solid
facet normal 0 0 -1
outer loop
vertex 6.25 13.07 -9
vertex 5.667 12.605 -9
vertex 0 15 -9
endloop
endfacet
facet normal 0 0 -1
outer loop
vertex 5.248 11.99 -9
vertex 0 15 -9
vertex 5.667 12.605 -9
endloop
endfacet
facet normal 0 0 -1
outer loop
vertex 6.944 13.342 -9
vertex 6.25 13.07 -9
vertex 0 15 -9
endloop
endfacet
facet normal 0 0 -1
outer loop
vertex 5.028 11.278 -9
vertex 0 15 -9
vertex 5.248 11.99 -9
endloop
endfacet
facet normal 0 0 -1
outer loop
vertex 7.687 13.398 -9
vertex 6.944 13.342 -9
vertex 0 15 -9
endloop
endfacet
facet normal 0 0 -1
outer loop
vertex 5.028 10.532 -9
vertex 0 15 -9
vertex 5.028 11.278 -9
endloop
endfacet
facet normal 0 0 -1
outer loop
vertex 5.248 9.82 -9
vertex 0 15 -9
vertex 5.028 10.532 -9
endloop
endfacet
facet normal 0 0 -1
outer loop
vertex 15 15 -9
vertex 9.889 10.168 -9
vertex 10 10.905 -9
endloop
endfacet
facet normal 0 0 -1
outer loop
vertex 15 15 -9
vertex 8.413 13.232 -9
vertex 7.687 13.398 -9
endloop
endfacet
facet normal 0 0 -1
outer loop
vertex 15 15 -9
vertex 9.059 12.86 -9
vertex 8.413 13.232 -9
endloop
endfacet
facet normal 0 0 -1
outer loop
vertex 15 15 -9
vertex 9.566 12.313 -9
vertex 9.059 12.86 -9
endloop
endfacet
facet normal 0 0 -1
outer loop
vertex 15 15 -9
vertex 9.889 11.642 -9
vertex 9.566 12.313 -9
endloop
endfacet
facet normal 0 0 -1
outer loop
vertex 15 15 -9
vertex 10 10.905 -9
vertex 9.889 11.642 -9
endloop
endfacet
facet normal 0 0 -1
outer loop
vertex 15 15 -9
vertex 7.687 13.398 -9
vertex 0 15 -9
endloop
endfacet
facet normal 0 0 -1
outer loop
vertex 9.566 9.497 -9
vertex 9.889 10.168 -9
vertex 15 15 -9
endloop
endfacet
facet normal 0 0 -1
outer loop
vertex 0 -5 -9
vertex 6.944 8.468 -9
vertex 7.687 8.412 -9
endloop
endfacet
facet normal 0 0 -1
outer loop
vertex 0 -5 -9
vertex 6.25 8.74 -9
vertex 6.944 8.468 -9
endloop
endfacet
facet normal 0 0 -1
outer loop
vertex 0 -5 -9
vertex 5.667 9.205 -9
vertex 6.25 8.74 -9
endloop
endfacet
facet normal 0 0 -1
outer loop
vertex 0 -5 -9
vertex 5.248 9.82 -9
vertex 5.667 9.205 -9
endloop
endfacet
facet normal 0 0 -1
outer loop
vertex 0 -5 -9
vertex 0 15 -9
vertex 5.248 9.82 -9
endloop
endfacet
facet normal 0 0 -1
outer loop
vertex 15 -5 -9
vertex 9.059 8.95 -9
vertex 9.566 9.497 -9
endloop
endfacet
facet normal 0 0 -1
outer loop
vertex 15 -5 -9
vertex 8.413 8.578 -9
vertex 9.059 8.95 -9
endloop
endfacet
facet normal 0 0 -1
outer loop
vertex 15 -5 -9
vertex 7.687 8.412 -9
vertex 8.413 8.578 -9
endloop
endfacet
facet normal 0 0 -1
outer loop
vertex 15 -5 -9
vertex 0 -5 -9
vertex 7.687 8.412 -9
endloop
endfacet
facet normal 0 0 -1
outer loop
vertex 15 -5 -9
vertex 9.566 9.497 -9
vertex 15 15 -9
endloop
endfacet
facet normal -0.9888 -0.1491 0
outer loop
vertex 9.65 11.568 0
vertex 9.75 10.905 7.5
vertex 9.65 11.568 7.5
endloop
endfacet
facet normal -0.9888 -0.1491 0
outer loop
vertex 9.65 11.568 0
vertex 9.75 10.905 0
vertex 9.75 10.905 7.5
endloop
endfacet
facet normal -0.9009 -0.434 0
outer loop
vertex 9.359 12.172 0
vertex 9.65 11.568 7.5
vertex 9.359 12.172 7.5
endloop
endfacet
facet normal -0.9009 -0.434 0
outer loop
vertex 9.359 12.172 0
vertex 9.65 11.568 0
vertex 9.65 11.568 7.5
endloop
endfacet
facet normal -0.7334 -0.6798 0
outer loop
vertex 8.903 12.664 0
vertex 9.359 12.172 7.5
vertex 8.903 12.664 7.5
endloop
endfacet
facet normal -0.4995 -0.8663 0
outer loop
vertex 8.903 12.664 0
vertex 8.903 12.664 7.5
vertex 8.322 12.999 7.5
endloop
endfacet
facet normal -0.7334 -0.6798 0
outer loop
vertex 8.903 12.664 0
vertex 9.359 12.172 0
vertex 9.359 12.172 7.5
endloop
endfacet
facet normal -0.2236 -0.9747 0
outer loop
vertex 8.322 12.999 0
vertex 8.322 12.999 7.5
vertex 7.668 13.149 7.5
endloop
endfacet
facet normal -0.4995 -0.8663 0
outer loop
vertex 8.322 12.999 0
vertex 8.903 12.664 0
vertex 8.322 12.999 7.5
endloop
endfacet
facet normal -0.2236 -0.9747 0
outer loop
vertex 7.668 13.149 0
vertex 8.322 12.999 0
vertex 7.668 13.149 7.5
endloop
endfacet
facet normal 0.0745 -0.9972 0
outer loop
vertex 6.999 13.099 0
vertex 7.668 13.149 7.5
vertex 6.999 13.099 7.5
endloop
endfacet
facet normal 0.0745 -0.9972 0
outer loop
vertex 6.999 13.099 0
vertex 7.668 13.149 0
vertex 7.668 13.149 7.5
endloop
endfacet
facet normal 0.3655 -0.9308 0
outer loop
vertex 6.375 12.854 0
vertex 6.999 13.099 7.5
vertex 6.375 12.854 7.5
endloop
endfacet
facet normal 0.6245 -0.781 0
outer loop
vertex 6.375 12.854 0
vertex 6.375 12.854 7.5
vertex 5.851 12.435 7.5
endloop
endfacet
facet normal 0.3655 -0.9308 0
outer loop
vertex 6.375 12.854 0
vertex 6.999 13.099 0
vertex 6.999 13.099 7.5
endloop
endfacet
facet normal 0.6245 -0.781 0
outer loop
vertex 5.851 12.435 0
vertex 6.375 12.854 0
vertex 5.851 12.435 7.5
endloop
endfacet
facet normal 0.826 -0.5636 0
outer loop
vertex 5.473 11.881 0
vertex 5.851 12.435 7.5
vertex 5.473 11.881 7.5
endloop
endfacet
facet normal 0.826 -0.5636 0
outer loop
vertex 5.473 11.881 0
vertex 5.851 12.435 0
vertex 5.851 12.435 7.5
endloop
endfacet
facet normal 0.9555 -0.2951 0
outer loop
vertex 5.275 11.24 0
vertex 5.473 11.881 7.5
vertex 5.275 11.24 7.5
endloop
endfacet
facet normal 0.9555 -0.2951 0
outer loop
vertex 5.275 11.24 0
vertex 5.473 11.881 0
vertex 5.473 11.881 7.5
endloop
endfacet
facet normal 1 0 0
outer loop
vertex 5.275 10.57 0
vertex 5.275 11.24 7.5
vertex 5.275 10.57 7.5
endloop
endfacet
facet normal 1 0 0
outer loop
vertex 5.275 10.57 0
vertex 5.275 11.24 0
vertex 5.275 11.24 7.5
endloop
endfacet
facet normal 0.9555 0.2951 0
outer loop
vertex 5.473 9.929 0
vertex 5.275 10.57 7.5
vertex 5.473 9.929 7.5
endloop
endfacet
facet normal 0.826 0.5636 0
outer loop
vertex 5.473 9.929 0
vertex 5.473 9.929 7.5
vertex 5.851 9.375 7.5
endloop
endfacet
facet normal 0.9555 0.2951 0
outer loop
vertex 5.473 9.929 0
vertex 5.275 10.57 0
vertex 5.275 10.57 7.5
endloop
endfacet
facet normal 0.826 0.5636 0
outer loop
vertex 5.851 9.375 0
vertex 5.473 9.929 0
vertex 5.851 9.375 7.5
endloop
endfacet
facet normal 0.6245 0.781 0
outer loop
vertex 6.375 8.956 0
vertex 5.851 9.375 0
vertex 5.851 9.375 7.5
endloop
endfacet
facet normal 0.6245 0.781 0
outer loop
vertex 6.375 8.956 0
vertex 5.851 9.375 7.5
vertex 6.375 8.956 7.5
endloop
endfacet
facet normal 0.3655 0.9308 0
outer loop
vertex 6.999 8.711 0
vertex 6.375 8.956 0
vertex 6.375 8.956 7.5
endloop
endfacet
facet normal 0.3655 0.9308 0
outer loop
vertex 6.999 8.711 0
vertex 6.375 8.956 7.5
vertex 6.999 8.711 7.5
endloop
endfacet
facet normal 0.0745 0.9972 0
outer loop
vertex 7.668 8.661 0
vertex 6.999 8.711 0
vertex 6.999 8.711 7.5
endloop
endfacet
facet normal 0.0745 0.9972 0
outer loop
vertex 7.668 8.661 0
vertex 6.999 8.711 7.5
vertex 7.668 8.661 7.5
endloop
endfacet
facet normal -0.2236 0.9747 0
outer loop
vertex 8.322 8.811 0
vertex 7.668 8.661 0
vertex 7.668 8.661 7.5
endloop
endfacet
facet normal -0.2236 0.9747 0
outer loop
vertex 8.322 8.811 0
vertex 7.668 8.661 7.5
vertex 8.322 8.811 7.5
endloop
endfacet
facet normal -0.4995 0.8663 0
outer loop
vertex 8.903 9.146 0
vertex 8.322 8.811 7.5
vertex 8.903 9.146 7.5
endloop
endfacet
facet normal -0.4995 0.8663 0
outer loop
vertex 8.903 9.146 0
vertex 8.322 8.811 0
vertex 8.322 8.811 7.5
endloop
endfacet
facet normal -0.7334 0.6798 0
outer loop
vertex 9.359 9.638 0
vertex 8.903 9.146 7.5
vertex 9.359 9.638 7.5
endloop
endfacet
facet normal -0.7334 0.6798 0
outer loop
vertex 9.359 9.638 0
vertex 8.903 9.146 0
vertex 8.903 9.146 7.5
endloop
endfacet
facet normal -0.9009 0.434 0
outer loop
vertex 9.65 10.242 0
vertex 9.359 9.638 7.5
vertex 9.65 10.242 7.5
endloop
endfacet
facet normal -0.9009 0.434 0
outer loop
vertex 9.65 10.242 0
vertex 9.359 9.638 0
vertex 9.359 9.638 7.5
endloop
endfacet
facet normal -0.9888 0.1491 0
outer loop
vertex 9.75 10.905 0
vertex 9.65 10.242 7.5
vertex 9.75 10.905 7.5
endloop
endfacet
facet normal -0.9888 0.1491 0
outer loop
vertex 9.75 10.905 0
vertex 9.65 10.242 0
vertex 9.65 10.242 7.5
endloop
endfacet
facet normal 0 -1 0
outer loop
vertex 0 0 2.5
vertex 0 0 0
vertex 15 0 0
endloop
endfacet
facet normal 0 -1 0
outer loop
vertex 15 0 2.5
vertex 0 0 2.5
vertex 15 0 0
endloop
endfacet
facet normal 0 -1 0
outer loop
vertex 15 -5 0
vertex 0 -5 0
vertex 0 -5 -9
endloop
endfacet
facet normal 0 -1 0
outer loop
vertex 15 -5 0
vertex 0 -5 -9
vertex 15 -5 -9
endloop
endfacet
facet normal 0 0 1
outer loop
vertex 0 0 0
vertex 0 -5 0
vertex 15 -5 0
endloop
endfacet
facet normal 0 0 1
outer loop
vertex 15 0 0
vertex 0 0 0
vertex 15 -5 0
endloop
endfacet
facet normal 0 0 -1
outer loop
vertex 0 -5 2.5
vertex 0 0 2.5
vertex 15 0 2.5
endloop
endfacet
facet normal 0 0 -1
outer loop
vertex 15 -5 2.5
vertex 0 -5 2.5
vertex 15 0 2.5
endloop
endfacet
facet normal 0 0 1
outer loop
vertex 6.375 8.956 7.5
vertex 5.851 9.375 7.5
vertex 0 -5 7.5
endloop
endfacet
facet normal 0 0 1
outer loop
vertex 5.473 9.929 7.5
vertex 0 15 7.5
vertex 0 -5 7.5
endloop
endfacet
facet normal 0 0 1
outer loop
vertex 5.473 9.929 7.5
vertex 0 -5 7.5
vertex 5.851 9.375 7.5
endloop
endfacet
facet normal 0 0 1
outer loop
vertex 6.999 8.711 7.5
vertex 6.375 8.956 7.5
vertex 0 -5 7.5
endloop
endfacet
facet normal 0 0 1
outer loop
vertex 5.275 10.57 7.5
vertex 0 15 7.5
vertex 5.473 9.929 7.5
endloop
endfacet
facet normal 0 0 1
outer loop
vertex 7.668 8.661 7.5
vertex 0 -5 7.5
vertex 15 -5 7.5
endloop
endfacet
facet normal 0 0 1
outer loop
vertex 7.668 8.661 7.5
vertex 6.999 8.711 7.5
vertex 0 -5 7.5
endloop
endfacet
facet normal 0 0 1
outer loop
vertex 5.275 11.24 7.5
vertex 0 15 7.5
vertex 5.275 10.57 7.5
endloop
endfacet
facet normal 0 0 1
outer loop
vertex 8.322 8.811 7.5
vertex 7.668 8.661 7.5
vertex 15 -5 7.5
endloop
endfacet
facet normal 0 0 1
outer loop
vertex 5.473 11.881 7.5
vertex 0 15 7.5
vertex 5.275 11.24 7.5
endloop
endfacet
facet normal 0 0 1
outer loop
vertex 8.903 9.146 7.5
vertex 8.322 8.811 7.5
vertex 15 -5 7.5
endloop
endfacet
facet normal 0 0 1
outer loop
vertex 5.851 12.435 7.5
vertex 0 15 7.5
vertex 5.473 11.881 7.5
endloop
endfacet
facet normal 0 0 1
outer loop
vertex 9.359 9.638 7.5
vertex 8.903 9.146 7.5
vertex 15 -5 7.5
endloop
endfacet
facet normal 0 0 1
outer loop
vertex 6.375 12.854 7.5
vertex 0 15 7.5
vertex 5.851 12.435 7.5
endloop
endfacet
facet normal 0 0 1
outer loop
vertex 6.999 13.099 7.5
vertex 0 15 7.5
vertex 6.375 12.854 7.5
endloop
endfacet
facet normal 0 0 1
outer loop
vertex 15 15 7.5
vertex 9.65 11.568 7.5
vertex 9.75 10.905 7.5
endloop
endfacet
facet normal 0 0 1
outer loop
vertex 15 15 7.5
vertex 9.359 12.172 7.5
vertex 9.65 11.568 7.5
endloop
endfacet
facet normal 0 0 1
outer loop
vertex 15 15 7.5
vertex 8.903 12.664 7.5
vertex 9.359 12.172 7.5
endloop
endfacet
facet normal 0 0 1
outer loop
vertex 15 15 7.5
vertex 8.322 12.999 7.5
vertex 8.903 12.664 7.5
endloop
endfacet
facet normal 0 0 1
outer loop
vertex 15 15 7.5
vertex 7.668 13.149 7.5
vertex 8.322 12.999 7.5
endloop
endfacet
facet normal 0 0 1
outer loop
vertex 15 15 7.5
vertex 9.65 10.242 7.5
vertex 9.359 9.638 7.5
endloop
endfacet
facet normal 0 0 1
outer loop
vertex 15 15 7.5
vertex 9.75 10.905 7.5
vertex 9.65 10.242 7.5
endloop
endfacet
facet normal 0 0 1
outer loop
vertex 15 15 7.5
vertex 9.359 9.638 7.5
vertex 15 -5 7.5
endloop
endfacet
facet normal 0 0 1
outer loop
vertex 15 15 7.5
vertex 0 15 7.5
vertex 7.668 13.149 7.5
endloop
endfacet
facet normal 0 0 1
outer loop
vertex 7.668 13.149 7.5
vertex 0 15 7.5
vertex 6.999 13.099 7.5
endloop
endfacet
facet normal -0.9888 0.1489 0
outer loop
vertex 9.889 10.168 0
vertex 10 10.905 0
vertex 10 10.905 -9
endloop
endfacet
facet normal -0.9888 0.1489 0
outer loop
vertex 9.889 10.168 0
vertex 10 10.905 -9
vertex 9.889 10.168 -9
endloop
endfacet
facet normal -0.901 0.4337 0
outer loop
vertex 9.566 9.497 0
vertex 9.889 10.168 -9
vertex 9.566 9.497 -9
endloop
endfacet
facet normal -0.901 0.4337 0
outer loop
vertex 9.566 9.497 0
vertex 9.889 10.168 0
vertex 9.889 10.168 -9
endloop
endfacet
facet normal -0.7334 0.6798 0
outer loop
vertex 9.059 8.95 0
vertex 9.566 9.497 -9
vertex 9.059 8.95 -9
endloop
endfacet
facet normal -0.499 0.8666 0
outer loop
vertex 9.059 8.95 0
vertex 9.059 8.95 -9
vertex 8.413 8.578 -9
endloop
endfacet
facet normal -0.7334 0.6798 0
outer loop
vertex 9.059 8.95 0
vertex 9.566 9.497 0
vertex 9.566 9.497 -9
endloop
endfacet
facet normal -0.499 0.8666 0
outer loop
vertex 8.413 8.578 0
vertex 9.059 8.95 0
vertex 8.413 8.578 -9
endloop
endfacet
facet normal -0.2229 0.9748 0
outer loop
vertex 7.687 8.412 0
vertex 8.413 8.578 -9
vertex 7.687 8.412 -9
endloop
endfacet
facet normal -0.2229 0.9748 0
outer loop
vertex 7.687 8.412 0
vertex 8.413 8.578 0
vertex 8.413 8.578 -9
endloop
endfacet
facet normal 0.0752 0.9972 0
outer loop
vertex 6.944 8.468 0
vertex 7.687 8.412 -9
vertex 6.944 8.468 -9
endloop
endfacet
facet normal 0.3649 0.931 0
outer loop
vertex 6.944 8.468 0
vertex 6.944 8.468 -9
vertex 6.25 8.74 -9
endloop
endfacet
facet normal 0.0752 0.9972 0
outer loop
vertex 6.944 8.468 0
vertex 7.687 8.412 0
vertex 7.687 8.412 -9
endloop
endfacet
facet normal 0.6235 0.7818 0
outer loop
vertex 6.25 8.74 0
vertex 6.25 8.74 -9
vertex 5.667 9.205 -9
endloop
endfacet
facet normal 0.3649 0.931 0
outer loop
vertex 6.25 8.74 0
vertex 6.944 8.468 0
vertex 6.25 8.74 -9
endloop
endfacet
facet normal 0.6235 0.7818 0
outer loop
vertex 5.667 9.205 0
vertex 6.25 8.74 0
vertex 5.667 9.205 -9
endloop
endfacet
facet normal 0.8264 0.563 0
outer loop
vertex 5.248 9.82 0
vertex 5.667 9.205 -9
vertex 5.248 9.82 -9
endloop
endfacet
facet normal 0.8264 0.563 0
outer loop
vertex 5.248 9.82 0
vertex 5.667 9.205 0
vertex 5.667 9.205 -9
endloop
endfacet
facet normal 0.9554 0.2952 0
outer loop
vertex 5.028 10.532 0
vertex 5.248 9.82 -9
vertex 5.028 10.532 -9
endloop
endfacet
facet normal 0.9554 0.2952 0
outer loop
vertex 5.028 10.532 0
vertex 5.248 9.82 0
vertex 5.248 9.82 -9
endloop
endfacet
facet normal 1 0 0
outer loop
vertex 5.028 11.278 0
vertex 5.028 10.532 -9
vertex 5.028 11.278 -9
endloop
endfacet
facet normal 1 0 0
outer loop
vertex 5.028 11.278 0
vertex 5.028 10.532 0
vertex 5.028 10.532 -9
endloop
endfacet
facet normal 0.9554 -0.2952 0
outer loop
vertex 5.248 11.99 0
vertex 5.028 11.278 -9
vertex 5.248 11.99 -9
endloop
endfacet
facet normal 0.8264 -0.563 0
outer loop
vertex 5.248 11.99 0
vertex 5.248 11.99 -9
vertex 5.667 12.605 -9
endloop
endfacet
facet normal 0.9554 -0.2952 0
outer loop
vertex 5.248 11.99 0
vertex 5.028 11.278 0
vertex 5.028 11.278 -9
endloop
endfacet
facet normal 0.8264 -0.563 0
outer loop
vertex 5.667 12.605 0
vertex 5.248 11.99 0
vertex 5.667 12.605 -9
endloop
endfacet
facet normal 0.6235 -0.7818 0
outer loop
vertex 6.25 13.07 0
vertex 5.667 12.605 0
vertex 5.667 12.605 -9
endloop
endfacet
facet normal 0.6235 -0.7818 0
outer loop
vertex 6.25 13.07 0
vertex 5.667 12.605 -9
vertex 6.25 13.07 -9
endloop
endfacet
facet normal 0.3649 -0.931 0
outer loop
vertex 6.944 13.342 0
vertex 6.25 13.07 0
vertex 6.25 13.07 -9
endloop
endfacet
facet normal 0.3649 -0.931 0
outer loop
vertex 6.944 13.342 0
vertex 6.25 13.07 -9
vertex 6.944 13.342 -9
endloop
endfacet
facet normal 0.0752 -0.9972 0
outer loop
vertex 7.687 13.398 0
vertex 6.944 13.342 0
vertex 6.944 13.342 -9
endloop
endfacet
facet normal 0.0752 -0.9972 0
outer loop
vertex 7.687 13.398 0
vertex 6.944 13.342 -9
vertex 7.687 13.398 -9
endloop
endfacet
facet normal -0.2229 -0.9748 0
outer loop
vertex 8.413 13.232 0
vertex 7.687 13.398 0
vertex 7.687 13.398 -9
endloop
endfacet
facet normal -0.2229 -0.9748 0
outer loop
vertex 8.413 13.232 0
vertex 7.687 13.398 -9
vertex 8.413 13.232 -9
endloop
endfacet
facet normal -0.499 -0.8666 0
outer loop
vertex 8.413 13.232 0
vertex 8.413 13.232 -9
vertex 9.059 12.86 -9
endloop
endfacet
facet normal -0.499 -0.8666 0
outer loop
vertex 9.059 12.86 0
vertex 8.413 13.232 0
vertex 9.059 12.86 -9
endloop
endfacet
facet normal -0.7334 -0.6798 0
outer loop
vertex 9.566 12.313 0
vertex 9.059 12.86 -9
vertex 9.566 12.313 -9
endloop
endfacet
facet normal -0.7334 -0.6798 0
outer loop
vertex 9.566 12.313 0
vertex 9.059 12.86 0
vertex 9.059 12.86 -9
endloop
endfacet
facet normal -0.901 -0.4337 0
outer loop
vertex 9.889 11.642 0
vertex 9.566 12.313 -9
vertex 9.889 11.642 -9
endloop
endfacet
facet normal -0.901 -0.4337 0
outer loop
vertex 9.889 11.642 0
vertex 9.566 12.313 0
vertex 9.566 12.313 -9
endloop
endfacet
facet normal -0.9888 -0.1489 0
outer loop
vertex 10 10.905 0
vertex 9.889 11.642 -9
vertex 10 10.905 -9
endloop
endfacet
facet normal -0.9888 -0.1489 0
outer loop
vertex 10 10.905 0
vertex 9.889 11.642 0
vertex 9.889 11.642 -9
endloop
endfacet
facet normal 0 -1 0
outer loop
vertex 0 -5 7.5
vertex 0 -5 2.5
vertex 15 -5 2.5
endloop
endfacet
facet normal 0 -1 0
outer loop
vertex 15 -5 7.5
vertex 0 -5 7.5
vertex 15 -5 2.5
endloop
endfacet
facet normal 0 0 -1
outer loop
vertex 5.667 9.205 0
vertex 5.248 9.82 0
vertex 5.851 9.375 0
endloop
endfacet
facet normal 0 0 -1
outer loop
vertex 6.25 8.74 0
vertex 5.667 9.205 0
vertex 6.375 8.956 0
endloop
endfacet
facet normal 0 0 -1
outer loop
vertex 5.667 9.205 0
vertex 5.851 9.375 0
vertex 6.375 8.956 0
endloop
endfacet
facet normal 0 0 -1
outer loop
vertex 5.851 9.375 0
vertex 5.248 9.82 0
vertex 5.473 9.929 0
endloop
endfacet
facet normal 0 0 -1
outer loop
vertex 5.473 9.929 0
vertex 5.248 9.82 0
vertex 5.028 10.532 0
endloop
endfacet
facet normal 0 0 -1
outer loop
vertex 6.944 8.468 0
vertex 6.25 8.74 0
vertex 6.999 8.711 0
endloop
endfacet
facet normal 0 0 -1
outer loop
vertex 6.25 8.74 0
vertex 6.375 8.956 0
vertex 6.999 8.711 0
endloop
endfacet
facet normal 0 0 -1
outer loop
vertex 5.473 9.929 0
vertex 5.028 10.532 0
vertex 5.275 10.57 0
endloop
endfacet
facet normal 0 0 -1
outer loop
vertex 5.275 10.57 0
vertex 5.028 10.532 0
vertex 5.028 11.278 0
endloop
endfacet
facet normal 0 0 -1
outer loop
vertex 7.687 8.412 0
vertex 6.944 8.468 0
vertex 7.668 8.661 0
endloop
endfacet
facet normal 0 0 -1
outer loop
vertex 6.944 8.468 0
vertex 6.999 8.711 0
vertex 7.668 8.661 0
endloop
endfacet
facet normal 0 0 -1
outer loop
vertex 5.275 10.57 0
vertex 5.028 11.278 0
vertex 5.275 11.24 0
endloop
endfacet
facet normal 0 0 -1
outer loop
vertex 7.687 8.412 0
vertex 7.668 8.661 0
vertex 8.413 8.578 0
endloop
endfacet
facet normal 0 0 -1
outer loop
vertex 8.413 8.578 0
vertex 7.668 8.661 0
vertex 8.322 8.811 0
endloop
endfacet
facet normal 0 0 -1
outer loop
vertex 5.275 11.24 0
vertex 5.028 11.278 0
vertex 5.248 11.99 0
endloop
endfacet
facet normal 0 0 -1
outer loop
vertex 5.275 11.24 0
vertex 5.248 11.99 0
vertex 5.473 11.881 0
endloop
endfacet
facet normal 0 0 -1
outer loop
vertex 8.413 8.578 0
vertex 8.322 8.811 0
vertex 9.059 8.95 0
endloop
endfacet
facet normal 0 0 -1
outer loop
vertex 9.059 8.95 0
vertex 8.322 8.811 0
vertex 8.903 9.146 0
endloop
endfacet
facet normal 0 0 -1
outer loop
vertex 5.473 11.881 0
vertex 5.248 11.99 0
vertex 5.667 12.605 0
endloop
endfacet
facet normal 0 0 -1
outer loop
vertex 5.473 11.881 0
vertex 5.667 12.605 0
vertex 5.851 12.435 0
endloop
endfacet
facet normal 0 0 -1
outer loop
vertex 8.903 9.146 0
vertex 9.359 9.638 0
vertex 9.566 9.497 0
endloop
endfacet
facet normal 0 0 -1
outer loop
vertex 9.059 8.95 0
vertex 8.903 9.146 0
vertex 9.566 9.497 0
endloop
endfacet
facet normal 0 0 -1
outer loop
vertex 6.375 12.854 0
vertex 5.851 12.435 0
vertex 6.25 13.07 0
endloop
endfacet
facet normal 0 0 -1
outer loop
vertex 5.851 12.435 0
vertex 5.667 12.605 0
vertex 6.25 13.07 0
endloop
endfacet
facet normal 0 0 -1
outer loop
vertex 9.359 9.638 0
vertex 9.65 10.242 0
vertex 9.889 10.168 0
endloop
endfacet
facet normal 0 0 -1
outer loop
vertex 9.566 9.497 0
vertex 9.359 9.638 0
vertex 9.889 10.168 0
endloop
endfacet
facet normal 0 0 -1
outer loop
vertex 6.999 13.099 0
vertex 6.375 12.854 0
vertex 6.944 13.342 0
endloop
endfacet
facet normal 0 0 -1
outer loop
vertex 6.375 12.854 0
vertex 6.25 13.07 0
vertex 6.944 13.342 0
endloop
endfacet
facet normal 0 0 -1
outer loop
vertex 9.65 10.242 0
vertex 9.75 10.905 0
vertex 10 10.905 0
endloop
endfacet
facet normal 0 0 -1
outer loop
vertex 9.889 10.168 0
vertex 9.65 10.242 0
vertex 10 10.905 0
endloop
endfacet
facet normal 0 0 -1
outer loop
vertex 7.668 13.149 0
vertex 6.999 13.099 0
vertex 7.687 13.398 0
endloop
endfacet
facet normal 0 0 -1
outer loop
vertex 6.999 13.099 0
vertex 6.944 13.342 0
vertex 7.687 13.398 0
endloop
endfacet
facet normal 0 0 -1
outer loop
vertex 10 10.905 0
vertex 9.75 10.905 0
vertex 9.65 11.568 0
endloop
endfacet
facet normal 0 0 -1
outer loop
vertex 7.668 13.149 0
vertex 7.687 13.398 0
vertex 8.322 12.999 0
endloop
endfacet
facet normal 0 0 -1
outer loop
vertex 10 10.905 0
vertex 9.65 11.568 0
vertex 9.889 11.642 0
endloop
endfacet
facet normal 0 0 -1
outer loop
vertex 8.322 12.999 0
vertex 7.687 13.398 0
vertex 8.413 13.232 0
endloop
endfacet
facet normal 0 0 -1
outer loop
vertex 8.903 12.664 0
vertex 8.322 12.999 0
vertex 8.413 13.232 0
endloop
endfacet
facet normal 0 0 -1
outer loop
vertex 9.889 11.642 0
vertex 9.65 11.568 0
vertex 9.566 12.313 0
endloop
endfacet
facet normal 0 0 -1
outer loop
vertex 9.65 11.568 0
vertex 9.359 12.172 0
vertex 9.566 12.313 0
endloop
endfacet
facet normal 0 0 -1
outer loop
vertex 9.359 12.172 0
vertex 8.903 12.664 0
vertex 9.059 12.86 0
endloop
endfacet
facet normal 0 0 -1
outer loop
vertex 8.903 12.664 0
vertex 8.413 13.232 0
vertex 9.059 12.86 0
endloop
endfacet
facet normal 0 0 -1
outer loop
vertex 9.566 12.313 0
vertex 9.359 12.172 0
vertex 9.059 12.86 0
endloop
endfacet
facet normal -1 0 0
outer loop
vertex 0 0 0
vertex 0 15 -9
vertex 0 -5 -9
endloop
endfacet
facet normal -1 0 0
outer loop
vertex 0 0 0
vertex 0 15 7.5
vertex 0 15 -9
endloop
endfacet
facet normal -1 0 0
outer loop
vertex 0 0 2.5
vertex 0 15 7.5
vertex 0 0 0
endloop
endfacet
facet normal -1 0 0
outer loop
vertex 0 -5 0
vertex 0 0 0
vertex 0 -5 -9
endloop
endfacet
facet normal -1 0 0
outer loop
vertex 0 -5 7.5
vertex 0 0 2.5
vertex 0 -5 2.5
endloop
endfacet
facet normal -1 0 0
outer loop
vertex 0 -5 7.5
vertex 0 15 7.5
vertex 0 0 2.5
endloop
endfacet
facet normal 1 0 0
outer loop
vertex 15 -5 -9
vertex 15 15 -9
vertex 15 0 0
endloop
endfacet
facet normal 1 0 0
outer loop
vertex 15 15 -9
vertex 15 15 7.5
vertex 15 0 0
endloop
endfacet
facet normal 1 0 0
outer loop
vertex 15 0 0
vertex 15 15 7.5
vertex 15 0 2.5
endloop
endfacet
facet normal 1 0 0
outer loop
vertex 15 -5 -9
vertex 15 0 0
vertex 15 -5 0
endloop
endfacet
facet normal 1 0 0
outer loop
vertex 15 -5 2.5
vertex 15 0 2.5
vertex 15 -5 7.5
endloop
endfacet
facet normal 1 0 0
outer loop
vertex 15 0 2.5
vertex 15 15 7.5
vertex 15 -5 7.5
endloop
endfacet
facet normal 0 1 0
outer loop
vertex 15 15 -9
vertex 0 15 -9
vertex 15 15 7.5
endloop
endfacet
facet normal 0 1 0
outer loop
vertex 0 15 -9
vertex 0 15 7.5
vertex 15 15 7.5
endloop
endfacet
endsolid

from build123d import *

# Parameters (mm, degrees)
F0_W     = 15
F0_H     = 15
F0_R     = 2.25
F1_DEPTH = 2.5
F2_W     = 15
F2_H     = 20
F2_R     = 2.25
F3_DEPTH = 5
F4_W     = 15
F4_H     = 20
F4_R     = 2.5
F5_DEPTH = 9


with BuildPart() as f1:
    # F0 (on Top) → F1 (new body)
    with BuildSketch(Plane.XY):
        with Locations((7.5, 7.5)):
            Rectangle(F0_W, F0_H)
        with Locations((7.5, 10.905)):
            Circle(F0_R, mode=Mode.SUBTRACT)
    extrude(amount=F1_DEPTH)

    # F2 (on face) → F3 (join)
    with BuildSketch(Plane.XY.offset(2.5)):
        with Locations((7.5, 5)):
            Rectangle(F2_W, F2_H)
        with Locations((7.5, 10.905)):
            Circle(F2_R, mode=Mode.SUBTRACT)
    extrude(amount=F3_DEPTH)

    # F4 (on face) → F5 (join)
    with BuildSketch(Plane(origin=(0, 0, 0), x_dir=(1, 0, 0), z_dir=(0, 0, -1))):
        with Locations((7.5, -5)):
            Rectangle(F4_W, F4_H)
        with Locations((7.5, -10.905)):
            Circle(F4_R, mode=Mode.SUBTRACT)
    extrude(amount=F5_DEPTH)


solid = f1.part
